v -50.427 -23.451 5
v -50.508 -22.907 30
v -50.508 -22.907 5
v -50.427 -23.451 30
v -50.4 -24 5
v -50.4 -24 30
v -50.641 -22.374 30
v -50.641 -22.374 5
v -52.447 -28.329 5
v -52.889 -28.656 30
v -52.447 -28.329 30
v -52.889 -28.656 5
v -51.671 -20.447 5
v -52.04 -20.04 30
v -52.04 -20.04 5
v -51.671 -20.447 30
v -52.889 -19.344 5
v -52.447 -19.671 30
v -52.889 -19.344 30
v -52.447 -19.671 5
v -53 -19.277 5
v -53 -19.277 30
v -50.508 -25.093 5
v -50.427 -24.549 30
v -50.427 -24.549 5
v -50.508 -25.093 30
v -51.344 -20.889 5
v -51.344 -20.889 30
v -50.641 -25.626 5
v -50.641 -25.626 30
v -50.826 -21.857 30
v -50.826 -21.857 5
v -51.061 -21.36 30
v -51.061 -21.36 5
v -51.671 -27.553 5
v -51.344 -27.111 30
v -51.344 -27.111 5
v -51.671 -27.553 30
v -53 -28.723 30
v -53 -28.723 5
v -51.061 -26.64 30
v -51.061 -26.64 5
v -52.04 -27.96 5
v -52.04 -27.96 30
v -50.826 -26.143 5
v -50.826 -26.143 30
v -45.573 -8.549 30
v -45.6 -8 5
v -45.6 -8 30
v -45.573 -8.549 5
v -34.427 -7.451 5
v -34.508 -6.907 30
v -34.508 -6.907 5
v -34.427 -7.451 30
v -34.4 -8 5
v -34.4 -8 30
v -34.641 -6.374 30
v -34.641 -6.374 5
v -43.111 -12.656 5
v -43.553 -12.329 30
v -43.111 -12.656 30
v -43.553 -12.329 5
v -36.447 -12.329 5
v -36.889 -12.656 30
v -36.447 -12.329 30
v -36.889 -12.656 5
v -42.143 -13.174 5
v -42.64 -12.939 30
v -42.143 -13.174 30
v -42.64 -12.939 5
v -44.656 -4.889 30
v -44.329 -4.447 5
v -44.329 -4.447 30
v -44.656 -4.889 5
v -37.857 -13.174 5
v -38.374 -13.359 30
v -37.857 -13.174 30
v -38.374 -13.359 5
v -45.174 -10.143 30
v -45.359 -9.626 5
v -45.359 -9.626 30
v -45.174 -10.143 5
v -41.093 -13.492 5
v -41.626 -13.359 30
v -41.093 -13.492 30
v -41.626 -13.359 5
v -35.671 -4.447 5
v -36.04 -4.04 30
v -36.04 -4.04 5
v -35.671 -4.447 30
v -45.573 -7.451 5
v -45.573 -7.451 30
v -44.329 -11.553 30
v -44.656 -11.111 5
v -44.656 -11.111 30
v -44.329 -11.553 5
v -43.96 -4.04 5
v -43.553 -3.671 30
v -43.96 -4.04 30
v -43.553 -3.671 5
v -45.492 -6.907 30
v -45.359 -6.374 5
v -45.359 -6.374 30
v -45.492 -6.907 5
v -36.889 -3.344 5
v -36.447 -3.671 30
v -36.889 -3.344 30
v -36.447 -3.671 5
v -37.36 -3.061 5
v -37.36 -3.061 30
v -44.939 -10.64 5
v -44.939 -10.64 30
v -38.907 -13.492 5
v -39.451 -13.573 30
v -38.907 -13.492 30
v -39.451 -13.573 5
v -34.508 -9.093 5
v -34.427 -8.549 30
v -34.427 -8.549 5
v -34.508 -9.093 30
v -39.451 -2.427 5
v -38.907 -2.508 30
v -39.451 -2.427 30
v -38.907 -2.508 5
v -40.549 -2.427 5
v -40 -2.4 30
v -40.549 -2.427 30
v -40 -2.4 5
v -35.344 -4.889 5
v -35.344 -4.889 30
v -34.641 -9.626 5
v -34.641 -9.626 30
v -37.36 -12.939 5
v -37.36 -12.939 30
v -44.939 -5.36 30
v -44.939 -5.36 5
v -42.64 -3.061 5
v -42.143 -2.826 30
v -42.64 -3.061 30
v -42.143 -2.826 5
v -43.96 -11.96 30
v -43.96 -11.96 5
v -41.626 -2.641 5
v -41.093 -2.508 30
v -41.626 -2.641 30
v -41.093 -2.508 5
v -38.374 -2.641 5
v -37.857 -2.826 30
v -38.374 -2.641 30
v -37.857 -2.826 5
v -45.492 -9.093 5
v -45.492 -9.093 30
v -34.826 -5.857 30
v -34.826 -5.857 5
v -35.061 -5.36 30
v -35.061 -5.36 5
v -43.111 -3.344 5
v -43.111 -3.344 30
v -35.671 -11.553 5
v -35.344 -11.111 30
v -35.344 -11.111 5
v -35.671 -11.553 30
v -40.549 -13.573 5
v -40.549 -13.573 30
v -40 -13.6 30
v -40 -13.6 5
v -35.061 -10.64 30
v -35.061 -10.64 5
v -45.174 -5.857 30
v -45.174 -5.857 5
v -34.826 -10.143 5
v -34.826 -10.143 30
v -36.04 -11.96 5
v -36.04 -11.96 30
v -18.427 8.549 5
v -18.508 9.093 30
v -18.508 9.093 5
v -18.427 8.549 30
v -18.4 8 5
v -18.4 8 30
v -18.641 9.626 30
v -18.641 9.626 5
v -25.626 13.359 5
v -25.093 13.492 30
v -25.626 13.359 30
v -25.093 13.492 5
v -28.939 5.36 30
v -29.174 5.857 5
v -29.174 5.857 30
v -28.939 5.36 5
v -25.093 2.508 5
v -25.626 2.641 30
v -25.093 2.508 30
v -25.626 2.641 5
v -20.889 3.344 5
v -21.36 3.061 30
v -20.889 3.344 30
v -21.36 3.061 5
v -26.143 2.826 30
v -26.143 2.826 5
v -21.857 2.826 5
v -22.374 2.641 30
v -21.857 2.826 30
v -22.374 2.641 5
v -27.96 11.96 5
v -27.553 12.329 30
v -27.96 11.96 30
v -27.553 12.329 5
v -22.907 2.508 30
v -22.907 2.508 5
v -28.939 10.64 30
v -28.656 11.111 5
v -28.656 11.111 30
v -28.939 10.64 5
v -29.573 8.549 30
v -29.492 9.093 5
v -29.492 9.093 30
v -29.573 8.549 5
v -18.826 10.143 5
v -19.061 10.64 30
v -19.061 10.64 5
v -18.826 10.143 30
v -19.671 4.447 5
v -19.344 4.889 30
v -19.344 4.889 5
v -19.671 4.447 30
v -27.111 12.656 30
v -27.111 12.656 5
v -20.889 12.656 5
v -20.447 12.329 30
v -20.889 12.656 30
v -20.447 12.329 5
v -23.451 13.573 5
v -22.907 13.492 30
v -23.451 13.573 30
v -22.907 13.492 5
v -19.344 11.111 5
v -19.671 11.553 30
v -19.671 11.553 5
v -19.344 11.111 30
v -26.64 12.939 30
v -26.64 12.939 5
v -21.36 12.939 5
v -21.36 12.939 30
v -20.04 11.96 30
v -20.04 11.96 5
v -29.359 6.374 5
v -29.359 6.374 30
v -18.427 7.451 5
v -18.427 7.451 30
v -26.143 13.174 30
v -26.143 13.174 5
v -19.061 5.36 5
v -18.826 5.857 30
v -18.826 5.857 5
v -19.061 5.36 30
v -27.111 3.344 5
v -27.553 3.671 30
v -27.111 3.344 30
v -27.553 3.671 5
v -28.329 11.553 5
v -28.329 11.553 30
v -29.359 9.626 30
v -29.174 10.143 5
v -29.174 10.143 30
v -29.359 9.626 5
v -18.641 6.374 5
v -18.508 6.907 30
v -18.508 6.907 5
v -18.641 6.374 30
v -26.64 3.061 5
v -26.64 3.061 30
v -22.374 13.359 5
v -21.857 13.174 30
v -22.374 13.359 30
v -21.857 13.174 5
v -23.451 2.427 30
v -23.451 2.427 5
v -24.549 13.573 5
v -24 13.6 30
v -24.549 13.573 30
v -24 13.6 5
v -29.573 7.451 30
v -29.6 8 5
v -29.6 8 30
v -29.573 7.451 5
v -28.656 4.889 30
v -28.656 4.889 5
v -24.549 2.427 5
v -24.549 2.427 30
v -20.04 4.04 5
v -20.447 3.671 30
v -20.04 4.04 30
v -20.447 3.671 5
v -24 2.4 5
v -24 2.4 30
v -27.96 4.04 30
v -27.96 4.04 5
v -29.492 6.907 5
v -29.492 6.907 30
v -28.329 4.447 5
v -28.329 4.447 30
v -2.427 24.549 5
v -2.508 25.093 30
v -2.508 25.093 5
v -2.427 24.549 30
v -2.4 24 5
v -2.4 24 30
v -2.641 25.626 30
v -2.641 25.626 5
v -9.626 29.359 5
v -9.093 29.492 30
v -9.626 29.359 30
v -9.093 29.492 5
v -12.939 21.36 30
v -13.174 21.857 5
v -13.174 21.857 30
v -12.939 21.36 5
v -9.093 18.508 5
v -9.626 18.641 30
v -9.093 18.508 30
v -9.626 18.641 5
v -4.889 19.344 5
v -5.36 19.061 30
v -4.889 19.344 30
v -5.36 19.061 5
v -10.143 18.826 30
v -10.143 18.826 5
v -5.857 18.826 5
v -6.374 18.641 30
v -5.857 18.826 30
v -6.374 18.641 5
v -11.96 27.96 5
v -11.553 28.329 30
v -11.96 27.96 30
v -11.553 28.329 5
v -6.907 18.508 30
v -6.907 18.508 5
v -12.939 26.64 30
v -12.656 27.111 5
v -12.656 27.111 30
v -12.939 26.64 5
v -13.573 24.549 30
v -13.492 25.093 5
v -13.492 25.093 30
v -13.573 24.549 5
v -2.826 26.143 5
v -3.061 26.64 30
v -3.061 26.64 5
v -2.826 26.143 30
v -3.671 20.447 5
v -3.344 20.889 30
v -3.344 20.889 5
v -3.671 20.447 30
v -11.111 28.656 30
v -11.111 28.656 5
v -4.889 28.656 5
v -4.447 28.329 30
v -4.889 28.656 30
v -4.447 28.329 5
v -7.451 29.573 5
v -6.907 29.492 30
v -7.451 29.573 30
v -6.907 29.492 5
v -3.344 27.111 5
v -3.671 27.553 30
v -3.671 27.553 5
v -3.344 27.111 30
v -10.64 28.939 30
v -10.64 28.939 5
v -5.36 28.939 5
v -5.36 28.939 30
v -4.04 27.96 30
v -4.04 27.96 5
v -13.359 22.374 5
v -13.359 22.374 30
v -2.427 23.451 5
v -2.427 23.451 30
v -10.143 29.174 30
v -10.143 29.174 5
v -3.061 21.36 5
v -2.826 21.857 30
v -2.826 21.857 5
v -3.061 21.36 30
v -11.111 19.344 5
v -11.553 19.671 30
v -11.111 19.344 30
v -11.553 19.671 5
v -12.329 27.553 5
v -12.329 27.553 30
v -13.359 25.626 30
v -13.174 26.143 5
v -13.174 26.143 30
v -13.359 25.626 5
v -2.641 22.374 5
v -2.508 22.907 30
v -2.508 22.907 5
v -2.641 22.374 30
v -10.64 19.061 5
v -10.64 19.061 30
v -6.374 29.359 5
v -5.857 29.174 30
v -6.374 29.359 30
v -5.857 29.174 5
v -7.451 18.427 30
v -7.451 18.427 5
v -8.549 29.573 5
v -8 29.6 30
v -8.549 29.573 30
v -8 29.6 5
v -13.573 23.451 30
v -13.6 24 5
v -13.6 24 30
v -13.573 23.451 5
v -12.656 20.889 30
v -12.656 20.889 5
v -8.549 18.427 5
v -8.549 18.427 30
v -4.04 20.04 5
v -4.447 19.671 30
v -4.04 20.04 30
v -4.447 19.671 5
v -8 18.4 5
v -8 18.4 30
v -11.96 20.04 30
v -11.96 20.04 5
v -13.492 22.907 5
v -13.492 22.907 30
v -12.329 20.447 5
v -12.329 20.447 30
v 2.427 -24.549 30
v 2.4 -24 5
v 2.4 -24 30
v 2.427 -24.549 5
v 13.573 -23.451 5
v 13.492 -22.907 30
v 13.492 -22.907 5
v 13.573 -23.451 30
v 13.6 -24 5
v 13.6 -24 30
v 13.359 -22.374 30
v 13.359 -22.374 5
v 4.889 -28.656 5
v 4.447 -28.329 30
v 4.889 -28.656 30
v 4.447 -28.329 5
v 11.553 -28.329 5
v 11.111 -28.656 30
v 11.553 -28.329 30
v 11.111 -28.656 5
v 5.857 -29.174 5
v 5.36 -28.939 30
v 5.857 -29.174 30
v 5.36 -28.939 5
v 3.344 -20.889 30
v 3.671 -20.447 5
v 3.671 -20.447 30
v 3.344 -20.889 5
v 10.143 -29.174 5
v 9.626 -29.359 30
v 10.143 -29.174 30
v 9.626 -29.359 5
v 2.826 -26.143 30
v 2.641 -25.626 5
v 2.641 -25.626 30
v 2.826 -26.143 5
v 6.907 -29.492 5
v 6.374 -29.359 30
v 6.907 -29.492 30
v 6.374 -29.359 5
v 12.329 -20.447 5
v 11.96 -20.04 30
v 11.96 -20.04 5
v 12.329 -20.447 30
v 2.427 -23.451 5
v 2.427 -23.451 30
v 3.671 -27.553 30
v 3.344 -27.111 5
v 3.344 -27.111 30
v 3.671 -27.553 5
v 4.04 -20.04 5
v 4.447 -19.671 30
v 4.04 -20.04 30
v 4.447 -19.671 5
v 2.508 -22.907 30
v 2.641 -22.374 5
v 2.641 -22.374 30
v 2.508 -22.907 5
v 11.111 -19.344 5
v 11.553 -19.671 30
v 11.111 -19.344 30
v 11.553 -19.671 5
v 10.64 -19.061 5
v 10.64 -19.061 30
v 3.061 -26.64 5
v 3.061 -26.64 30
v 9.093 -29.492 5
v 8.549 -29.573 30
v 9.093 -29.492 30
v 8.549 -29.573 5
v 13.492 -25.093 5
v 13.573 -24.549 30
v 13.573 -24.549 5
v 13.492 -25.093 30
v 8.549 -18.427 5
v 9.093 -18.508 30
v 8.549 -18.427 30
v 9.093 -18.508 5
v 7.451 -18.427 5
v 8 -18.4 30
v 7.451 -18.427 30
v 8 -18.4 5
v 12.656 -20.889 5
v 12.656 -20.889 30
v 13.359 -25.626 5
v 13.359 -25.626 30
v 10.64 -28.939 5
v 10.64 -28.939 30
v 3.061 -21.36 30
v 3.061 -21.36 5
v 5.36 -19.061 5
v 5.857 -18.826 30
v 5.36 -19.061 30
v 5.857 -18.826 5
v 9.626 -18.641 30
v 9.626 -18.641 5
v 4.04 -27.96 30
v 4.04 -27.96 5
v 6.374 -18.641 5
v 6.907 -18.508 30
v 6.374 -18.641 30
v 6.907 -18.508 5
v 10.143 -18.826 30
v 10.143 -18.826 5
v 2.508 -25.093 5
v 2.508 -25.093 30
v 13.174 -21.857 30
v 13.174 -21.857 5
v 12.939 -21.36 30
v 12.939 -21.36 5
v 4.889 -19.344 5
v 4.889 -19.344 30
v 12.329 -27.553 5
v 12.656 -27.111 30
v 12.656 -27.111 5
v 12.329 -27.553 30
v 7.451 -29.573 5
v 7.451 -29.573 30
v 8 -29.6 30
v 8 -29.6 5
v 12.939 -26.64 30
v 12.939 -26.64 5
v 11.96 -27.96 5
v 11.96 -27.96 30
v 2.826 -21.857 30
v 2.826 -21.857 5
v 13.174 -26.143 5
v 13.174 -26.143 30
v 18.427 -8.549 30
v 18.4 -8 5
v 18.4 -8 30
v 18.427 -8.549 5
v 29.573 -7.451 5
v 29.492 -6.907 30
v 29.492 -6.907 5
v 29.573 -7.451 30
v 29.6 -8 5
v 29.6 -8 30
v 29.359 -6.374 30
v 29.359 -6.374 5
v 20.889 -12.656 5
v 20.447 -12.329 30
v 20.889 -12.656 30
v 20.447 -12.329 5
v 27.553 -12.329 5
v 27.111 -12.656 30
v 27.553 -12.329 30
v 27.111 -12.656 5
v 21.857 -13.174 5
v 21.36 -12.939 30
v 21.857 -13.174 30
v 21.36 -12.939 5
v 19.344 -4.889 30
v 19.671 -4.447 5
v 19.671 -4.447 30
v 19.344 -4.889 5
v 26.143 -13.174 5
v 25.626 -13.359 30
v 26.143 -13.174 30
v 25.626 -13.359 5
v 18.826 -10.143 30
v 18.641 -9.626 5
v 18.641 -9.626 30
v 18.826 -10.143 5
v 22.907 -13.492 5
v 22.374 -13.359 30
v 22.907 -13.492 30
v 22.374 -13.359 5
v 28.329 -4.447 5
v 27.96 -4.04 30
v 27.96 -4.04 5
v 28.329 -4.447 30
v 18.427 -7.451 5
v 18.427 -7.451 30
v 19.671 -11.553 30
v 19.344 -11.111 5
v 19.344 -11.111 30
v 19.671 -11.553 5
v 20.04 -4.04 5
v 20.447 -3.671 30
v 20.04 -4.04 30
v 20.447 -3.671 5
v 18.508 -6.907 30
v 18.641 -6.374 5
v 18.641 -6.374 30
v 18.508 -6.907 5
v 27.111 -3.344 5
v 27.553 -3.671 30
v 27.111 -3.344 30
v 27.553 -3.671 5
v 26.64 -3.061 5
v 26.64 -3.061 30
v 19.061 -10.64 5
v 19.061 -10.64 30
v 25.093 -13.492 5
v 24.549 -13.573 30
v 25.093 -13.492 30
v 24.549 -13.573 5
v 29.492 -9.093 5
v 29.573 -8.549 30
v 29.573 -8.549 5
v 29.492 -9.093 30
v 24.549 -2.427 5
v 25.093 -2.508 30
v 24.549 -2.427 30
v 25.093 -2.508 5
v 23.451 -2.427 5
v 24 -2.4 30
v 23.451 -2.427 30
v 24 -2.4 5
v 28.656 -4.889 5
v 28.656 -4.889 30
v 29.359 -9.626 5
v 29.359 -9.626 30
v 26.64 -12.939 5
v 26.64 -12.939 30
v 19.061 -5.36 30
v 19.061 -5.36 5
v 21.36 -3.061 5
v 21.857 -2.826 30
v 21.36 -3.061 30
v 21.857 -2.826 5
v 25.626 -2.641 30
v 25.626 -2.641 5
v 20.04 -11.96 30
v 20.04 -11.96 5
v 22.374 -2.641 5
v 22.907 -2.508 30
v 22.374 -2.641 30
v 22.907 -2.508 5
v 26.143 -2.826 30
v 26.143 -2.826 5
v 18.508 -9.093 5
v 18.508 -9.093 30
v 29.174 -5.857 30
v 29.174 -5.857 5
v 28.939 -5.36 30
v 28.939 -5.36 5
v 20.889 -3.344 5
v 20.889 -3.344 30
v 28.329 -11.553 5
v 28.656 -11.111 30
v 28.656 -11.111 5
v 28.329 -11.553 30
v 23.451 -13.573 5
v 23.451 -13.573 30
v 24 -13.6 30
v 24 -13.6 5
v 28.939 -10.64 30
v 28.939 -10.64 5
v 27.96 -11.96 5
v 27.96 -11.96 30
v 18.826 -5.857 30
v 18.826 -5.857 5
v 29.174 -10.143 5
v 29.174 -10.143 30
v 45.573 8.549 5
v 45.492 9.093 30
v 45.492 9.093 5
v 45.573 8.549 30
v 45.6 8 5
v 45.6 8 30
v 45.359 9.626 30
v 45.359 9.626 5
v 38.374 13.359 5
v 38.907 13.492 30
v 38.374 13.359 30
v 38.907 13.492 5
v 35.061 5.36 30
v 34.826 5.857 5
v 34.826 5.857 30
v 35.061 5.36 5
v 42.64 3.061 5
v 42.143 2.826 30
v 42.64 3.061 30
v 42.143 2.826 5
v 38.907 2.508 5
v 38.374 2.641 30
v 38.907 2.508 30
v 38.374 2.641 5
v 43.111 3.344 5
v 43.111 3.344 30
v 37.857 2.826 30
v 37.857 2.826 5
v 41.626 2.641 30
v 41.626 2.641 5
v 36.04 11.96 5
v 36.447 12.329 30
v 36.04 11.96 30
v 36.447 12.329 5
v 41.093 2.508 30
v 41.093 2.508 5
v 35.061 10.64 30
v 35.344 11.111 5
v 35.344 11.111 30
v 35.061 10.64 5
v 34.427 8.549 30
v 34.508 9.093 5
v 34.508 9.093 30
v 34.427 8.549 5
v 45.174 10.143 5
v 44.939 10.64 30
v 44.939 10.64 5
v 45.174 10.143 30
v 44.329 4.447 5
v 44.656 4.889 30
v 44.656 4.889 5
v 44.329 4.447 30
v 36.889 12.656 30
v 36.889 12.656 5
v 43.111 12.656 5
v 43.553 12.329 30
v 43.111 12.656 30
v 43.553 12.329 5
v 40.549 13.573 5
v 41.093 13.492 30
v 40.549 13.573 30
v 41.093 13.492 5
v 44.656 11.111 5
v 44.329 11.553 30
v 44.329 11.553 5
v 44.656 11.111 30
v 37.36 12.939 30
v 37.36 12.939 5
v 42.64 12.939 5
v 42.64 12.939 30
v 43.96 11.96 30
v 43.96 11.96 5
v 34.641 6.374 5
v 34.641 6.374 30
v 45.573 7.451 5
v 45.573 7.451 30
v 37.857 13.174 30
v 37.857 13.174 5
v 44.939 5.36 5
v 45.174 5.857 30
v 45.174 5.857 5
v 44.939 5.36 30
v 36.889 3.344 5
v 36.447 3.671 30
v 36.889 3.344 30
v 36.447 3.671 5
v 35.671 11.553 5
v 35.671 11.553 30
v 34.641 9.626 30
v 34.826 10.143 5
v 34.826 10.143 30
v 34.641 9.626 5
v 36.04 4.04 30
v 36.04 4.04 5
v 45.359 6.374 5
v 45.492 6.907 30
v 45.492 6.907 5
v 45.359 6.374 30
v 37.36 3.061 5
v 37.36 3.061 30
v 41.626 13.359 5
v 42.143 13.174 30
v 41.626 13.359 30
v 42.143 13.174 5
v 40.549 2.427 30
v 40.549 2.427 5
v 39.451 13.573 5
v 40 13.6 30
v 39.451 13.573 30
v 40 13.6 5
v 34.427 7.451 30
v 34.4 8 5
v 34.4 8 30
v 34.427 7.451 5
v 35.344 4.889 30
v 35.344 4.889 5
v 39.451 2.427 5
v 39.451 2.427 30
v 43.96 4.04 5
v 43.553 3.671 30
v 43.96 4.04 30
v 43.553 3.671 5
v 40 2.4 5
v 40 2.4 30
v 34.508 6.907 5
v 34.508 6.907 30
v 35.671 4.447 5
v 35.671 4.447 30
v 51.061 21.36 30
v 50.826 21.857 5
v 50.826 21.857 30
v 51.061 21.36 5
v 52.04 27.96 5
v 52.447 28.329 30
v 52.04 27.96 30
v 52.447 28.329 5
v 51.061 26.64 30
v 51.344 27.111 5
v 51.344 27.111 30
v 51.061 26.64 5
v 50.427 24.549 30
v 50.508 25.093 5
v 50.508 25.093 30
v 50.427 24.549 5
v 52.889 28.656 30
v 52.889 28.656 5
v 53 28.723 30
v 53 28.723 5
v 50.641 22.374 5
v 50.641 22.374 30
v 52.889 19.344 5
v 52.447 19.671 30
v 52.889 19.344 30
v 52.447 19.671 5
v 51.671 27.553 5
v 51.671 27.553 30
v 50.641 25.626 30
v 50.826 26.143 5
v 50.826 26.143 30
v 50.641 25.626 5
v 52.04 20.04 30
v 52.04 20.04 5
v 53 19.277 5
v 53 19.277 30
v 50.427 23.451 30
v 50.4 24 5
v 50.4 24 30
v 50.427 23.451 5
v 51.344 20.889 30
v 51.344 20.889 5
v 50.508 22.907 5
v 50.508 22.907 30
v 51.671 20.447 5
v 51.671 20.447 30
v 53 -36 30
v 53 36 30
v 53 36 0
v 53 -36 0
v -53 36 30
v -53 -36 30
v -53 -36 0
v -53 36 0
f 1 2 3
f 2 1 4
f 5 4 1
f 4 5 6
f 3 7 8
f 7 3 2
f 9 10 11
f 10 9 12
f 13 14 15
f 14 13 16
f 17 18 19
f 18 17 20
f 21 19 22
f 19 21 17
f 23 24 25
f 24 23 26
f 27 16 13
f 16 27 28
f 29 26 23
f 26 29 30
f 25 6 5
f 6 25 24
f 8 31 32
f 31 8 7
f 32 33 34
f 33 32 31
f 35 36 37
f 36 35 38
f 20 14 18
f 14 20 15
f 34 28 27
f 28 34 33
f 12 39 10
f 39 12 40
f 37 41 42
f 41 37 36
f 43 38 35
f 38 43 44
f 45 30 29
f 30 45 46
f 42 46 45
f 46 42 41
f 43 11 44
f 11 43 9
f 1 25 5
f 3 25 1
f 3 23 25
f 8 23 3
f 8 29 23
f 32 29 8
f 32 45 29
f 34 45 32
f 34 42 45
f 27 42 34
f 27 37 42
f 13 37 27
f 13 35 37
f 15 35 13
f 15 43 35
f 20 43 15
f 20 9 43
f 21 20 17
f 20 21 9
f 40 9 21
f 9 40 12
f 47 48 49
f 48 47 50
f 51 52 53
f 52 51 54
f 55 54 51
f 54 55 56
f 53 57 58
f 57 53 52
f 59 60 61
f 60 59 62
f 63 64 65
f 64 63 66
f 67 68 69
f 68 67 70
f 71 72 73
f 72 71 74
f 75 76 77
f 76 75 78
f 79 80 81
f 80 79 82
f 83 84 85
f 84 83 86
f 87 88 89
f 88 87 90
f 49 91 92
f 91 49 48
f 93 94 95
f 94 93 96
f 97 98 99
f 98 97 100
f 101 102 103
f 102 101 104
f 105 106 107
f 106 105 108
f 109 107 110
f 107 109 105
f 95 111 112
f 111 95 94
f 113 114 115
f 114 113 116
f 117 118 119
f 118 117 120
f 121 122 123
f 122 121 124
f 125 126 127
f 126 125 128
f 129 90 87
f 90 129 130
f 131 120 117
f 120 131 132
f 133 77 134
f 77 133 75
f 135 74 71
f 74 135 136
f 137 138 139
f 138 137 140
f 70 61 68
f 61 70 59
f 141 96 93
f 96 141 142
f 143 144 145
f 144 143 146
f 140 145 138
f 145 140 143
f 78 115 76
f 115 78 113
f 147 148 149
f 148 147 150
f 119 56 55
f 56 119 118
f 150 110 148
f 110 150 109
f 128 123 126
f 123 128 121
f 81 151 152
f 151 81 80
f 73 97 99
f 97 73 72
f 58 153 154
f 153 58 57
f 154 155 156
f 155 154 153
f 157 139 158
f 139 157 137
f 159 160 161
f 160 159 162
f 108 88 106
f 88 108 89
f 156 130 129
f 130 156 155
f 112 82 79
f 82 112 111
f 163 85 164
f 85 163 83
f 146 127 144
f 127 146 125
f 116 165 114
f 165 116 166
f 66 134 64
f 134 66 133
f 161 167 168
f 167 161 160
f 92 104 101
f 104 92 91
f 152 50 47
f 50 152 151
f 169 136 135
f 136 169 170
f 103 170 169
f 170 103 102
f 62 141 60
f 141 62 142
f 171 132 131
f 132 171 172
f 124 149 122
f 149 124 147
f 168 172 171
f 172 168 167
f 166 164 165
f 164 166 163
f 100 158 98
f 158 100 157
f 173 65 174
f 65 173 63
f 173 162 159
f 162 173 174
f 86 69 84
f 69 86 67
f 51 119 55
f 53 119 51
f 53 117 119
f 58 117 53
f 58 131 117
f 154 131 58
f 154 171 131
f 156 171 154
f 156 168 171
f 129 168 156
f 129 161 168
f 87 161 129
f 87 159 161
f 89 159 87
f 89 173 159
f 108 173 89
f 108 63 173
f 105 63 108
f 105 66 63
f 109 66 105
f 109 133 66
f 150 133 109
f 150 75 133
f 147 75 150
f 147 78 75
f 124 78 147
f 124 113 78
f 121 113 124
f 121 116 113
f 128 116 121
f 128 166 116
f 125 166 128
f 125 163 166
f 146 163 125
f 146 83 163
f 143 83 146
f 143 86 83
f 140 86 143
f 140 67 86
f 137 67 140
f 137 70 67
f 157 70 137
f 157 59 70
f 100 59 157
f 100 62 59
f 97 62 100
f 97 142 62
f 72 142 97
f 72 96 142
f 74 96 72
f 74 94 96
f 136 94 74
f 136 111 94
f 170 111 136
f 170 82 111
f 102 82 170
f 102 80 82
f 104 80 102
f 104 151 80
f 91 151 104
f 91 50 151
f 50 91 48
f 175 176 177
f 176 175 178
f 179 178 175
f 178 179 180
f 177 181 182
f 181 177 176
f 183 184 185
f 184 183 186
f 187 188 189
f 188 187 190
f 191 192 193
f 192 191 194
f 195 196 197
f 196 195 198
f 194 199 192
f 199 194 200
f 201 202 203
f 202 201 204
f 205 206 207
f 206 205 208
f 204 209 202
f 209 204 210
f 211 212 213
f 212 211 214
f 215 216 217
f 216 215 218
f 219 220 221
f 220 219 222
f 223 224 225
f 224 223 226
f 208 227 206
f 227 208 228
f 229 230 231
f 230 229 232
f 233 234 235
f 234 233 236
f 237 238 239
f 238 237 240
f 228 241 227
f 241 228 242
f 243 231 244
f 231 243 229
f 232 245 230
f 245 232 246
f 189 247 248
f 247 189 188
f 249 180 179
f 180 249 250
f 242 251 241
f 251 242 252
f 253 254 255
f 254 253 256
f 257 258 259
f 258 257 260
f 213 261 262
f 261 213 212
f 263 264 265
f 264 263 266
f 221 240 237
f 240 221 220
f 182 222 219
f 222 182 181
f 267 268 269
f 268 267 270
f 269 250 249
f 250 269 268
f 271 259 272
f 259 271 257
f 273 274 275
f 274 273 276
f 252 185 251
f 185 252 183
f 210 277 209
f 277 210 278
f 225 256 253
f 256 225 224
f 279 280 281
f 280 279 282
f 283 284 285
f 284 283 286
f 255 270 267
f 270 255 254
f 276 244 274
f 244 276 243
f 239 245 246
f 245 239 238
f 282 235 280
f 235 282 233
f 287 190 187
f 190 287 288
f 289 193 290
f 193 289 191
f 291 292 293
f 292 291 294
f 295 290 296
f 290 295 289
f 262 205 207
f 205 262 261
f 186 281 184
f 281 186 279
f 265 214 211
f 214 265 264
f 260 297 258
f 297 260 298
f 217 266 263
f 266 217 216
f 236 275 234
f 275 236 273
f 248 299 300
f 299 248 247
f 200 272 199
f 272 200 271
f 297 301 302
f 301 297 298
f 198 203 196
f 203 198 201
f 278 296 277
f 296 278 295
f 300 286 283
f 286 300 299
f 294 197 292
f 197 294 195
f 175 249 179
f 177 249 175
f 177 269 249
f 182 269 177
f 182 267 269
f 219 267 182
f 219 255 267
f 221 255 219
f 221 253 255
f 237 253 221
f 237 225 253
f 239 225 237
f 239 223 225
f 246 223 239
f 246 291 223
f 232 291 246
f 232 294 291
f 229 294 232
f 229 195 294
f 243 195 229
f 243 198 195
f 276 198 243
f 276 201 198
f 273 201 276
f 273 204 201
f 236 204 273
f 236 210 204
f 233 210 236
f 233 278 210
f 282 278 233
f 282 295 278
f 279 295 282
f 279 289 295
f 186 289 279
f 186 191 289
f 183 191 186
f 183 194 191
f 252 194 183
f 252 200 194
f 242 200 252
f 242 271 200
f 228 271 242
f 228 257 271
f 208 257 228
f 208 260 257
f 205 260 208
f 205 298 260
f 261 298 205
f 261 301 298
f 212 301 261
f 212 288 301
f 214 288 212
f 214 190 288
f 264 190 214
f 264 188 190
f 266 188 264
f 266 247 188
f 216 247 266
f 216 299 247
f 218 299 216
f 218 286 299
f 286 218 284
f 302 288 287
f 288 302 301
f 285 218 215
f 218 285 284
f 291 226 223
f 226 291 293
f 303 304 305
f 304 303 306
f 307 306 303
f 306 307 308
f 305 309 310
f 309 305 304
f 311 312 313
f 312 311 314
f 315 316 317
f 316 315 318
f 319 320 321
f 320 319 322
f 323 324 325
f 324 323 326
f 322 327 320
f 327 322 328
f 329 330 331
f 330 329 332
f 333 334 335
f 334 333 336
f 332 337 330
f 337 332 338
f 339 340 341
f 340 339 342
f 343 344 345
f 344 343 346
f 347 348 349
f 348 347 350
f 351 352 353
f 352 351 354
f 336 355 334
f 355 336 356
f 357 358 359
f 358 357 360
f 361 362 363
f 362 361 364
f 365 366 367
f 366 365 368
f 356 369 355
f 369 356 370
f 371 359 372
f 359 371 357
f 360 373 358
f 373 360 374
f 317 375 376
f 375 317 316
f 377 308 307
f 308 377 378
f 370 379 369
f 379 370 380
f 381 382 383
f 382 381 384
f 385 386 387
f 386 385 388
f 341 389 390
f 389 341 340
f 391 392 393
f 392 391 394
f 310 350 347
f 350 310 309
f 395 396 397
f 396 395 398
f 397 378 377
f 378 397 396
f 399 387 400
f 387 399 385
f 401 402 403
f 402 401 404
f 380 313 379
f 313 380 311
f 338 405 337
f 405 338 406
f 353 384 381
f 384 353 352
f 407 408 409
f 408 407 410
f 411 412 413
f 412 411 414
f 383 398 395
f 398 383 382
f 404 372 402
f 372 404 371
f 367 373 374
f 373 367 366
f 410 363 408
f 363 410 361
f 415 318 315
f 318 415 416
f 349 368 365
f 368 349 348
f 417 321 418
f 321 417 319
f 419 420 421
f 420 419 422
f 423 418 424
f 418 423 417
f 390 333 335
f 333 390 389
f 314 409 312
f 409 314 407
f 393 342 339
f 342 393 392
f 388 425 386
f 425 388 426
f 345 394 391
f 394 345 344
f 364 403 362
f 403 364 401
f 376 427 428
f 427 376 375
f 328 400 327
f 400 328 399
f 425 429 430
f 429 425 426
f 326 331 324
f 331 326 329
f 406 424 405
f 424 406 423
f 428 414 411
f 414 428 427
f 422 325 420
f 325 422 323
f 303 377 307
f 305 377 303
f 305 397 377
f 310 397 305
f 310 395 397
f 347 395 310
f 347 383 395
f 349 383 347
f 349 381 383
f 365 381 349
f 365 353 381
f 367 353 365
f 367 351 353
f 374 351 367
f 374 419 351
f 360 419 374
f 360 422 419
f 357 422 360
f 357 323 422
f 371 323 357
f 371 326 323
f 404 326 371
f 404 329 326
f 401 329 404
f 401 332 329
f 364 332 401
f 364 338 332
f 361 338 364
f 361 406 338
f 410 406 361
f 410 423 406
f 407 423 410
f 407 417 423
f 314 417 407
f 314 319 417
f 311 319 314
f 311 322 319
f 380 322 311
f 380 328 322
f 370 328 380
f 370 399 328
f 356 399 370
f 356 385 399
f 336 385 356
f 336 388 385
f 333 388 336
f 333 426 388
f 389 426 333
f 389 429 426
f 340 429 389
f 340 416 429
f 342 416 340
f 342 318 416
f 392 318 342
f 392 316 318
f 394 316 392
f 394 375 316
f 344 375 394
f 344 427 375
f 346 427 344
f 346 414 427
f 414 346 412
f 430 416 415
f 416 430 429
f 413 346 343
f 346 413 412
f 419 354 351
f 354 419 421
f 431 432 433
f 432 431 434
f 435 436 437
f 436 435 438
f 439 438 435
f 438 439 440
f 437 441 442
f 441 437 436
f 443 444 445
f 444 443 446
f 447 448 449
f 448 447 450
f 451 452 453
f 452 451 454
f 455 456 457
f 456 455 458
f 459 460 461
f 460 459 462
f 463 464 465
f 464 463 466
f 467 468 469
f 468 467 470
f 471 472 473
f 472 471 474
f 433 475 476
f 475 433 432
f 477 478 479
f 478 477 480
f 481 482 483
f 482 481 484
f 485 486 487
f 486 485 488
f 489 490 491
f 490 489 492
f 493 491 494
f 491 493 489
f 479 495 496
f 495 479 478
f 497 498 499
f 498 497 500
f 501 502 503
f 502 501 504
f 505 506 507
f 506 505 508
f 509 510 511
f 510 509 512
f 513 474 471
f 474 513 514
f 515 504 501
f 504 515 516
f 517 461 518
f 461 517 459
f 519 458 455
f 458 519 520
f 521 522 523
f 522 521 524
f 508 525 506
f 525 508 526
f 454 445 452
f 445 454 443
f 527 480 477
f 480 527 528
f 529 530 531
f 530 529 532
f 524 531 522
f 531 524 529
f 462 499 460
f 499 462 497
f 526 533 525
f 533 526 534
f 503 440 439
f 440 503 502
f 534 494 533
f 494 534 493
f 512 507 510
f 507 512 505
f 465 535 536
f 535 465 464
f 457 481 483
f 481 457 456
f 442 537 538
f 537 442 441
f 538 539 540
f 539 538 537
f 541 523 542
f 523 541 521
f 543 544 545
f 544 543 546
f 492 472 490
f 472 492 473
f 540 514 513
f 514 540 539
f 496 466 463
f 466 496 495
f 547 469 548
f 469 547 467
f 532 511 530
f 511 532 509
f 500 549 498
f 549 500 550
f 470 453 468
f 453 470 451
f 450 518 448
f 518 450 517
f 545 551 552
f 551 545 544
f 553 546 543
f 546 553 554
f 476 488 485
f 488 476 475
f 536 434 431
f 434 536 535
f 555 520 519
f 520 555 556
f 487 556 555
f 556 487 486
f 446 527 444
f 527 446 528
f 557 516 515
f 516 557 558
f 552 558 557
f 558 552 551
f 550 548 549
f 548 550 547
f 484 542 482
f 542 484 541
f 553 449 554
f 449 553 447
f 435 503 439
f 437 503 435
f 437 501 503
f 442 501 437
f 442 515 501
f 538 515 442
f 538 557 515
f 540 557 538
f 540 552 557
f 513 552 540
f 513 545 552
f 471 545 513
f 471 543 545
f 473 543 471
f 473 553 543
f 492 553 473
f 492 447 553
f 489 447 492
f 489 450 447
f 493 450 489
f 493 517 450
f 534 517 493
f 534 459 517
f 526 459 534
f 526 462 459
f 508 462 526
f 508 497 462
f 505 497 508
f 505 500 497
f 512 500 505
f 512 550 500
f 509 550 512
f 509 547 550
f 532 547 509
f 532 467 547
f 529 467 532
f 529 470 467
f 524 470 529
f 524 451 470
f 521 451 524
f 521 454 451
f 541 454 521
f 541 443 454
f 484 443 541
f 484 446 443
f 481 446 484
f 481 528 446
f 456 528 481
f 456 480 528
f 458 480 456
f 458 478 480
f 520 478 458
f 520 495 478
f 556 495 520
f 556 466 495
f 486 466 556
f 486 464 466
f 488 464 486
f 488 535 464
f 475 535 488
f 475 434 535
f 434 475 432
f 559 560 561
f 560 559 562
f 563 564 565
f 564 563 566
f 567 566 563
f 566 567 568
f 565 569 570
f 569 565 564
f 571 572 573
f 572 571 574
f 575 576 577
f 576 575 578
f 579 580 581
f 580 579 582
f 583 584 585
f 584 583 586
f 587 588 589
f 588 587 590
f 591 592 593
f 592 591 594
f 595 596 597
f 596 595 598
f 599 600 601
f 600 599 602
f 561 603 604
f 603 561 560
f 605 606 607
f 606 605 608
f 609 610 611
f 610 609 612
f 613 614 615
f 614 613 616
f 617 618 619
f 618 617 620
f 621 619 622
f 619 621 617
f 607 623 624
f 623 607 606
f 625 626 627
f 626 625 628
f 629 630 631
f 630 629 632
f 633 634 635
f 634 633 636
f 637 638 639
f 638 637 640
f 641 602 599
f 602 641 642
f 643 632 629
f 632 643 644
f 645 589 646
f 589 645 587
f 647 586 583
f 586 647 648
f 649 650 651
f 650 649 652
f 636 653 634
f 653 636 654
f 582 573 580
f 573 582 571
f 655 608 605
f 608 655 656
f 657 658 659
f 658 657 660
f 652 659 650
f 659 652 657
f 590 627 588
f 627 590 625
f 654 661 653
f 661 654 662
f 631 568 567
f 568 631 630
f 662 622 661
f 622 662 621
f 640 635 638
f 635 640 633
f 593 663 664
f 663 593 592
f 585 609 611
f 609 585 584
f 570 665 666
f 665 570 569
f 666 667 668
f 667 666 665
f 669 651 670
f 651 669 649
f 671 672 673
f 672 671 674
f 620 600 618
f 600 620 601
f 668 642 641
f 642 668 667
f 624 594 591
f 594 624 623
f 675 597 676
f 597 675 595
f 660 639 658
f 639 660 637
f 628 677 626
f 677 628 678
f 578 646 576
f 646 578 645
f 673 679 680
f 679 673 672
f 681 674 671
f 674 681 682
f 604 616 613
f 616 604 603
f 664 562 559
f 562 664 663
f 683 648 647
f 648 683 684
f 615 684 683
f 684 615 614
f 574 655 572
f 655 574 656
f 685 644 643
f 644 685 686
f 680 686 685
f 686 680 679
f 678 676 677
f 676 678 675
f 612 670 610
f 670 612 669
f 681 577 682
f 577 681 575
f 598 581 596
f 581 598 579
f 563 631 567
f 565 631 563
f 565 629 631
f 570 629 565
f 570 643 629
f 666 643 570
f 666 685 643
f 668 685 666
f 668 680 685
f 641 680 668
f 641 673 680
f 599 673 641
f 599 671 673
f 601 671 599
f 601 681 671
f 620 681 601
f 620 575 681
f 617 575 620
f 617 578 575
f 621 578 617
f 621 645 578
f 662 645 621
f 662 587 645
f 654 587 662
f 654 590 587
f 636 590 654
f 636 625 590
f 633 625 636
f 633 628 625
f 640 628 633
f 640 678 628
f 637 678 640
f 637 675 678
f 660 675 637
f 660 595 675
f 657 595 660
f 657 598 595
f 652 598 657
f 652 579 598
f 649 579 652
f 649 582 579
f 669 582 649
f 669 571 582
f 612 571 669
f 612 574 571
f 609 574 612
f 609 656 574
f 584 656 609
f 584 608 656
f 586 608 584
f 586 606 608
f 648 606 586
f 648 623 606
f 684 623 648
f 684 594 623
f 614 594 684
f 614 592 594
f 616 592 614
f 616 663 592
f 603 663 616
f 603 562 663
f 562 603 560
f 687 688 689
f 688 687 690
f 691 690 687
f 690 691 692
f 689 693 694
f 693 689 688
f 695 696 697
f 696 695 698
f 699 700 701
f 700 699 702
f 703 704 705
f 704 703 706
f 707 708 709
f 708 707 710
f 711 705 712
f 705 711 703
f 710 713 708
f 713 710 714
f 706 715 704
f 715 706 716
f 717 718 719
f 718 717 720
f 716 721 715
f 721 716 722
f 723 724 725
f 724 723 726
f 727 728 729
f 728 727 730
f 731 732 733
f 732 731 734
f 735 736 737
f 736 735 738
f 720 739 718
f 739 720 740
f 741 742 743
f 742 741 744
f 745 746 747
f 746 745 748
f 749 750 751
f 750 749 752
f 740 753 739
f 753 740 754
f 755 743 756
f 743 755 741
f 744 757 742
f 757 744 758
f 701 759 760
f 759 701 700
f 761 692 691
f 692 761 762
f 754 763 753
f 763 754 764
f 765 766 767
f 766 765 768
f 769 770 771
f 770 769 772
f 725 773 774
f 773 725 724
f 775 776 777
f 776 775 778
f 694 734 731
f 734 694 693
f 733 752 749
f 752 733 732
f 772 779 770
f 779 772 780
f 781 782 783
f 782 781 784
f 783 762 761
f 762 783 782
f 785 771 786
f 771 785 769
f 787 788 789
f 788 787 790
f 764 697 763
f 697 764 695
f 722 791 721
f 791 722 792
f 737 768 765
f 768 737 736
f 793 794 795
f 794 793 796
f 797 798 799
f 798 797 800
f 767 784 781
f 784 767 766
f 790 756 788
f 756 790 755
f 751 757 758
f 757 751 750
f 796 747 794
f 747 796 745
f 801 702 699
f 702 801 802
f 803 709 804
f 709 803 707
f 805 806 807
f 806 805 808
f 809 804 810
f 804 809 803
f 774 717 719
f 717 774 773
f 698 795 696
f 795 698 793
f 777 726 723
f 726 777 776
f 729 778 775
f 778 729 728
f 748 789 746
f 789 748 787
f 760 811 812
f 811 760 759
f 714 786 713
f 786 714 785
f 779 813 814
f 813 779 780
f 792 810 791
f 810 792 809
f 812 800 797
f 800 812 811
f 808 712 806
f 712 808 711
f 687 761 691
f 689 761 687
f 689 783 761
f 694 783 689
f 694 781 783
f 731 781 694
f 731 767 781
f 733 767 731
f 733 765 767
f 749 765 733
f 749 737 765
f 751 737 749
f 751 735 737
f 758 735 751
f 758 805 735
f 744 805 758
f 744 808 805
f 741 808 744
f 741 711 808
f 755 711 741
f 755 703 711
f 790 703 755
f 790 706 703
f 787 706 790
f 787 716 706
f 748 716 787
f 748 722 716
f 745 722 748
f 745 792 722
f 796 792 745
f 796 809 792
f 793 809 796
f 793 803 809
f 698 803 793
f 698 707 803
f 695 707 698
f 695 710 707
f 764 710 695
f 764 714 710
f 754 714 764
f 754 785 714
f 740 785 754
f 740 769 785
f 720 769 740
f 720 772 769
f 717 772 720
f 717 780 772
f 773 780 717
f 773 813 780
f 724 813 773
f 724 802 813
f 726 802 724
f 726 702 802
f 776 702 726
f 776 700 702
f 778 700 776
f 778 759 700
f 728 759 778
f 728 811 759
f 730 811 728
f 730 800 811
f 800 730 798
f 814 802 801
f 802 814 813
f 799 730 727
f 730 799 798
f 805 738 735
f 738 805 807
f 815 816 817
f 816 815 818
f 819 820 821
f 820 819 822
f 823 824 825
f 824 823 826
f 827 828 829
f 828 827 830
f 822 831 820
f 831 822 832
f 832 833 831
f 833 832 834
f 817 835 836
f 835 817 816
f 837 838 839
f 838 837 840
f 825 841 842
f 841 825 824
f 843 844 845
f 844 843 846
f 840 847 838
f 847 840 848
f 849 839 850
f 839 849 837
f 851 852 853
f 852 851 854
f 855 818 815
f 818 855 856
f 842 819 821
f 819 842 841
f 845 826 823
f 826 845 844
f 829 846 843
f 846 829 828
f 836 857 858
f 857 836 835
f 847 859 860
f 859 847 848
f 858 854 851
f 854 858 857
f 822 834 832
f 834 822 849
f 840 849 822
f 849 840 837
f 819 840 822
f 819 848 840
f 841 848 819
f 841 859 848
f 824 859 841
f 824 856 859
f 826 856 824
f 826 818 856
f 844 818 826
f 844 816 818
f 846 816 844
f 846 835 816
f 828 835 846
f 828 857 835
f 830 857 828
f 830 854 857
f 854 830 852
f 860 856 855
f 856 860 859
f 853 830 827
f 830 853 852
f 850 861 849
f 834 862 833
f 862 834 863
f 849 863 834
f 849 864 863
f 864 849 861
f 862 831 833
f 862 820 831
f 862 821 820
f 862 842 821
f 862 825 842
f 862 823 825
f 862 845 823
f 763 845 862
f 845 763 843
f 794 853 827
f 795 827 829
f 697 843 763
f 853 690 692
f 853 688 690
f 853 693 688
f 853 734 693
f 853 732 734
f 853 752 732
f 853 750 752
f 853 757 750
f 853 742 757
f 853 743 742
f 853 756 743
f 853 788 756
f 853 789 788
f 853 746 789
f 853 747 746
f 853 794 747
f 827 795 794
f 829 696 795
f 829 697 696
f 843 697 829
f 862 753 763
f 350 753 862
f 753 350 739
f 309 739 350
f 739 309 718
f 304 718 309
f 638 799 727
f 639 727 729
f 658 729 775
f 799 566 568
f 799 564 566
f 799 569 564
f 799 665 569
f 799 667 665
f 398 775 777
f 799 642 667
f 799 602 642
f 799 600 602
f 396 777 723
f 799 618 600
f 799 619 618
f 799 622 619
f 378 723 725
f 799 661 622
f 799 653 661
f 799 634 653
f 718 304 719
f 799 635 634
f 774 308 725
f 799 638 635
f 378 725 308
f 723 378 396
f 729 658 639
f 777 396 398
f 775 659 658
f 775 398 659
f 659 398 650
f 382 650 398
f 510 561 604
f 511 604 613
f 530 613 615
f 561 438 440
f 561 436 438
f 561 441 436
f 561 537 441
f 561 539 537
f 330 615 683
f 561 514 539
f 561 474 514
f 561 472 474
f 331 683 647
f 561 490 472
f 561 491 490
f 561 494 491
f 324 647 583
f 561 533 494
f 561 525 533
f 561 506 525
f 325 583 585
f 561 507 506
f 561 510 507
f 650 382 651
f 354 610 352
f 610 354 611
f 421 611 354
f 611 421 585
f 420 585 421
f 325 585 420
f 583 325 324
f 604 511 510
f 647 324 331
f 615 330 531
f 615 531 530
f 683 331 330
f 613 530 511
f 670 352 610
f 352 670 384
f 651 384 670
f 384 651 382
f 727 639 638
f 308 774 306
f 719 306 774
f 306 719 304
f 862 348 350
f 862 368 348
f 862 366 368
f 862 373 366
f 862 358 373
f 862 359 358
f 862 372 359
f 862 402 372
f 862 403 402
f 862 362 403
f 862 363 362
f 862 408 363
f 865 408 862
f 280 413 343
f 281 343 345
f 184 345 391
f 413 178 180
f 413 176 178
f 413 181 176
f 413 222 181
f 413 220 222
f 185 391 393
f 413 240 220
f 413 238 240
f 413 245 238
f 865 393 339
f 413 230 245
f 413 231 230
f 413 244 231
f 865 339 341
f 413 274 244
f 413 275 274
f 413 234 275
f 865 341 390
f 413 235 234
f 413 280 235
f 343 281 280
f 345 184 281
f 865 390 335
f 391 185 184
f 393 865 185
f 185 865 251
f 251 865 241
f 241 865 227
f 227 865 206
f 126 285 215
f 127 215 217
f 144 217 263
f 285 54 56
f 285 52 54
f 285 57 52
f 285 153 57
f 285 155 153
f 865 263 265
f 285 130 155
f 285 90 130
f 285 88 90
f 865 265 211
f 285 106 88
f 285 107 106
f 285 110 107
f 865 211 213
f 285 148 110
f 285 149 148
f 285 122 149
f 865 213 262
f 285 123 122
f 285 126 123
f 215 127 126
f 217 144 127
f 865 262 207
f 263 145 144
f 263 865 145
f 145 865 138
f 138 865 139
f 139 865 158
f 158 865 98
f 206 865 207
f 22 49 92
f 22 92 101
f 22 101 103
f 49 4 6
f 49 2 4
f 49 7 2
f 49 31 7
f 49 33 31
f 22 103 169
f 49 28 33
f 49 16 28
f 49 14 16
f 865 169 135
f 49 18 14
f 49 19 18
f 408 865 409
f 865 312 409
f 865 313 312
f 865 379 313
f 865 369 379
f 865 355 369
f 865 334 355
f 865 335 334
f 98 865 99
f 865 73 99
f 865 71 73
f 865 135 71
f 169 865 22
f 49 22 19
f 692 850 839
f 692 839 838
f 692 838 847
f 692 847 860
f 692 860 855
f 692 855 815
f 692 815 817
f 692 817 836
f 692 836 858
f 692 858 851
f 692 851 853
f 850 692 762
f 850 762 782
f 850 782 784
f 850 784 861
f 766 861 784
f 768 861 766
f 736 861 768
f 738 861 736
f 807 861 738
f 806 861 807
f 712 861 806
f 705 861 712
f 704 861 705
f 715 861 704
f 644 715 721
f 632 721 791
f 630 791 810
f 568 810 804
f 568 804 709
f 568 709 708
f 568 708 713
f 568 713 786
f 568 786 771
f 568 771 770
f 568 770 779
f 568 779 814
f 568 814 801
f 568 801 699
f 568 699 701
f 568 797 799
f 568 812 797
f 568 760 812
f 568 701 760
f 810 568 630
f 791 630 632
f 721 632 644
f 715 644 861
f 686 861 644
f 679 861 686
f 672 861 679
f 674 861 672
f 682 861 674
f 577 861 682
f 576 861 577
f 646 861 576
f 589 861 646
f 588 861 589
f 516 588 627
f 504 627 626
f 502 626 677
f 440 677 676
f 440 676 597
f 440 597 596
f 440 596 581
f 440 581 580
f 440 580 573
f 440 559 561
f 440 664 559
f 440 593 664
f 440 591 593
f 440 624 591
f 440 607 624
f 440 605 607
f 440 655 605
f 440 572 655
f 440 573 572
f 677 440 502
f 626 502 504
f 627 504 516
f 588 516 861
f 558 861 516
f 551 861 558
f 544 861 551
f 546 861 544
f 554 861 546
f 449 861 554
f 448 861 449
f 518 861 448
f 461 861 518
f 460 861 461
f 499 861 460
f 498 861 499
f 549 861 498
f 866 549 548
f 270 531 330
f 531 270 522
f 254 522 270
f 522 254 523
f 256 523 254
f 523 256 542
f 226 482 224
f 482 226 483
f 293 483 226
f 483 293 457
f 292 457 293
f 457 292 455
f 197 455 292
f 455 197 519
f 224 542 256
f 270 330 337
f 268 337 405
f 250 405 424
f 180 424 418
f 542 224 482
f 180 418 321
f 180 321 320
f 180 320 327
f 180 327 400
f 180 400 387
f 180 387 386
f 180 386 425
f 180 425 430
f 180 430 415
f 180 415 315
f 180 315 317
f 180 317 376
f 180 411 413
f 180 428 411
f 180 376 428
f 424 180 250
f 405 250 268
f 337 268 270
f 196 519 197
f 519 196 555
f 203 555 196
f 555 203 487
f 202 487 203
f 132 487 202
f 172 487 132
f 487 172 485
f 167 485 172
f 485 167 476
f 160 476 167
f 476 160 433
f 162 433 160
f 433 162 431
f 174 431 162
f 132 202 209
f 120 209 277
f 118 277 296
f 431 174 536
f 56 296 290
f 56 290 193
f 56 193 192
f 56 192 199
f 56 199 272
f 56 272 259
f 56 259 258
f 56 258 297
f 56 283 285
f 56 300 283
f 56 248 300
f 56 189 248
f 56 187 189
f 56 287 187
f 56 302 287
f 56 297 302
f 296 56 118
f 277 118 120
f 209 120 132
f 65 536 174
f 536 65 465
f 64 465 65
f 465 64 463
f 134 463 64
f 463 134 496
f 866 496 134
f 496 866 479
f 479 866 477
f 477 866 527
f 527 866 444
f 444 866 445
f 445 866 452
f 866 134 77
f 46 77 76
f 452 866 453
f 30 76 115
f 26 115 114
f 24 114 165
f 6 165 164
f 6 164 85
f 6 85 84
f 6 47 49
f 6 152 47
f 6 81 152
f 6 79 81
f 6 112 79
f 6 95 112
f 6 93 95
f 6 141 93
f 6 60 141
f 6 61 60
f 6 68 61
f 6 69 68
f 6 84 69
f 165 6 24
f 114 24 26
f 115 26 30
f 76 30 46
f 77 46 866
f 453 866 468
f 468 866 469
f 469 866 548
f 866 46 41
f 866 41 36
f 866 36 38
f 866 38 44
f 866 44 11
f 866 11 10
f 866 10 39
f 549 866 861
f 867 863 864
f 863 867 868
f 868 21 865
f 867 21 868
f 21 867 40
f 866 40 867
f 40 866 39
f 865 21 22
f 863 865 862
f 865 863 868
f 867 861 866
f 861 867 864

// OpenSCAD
// Bench rack for 1.5 mL microcentrifuge tubes
// Print orientation: base on XY plane, holes open upward (+Z)

// ---------------- Parameters ----------------
block_len    = 106;   // block length along X (mm)
block_wid    = 72;    // block width along Y (mm)
block_ht     = 30;    // block height along Z (mm)

hole_count   = 24;    // total number of tube holes
hole_rows    = 4;     // holes per row along Y
hole_pitch   = 16;    // centre-to-centre spacing in X and Y (mm)
hole_d       = 11.2;  // hole diameter (mm)
hole_depth   = 25;    // hole depth from top surface (mm)
floor_t      = block_ht - hole_depth; // solid floor thickness = 5 mm

eps          = 0.5;   // overshoot for clean boolean cuts (mm)

$fn = 64;             // circle resolution

// ---------------- Model ----------------
difference() {
    // Main block, centred in X/Y, sitting on z = 0
    translate([-block_len/2, -block_wid/2, 0])
        cube([block_len, block_wid, block_ht]);

    // Hole grid centred on the block
    for (i = [0 : hole_count - 1]) {
        x = (i - (hole_count - 1)/2) * hole_pitch;
        y = (i % hole_rows - (hole_rows - 1)/2) * hole_pitch;
        translate([x, y, floor_t])
            cylinder(d = hole_d, h = hole_depth + eps);
    }
}
